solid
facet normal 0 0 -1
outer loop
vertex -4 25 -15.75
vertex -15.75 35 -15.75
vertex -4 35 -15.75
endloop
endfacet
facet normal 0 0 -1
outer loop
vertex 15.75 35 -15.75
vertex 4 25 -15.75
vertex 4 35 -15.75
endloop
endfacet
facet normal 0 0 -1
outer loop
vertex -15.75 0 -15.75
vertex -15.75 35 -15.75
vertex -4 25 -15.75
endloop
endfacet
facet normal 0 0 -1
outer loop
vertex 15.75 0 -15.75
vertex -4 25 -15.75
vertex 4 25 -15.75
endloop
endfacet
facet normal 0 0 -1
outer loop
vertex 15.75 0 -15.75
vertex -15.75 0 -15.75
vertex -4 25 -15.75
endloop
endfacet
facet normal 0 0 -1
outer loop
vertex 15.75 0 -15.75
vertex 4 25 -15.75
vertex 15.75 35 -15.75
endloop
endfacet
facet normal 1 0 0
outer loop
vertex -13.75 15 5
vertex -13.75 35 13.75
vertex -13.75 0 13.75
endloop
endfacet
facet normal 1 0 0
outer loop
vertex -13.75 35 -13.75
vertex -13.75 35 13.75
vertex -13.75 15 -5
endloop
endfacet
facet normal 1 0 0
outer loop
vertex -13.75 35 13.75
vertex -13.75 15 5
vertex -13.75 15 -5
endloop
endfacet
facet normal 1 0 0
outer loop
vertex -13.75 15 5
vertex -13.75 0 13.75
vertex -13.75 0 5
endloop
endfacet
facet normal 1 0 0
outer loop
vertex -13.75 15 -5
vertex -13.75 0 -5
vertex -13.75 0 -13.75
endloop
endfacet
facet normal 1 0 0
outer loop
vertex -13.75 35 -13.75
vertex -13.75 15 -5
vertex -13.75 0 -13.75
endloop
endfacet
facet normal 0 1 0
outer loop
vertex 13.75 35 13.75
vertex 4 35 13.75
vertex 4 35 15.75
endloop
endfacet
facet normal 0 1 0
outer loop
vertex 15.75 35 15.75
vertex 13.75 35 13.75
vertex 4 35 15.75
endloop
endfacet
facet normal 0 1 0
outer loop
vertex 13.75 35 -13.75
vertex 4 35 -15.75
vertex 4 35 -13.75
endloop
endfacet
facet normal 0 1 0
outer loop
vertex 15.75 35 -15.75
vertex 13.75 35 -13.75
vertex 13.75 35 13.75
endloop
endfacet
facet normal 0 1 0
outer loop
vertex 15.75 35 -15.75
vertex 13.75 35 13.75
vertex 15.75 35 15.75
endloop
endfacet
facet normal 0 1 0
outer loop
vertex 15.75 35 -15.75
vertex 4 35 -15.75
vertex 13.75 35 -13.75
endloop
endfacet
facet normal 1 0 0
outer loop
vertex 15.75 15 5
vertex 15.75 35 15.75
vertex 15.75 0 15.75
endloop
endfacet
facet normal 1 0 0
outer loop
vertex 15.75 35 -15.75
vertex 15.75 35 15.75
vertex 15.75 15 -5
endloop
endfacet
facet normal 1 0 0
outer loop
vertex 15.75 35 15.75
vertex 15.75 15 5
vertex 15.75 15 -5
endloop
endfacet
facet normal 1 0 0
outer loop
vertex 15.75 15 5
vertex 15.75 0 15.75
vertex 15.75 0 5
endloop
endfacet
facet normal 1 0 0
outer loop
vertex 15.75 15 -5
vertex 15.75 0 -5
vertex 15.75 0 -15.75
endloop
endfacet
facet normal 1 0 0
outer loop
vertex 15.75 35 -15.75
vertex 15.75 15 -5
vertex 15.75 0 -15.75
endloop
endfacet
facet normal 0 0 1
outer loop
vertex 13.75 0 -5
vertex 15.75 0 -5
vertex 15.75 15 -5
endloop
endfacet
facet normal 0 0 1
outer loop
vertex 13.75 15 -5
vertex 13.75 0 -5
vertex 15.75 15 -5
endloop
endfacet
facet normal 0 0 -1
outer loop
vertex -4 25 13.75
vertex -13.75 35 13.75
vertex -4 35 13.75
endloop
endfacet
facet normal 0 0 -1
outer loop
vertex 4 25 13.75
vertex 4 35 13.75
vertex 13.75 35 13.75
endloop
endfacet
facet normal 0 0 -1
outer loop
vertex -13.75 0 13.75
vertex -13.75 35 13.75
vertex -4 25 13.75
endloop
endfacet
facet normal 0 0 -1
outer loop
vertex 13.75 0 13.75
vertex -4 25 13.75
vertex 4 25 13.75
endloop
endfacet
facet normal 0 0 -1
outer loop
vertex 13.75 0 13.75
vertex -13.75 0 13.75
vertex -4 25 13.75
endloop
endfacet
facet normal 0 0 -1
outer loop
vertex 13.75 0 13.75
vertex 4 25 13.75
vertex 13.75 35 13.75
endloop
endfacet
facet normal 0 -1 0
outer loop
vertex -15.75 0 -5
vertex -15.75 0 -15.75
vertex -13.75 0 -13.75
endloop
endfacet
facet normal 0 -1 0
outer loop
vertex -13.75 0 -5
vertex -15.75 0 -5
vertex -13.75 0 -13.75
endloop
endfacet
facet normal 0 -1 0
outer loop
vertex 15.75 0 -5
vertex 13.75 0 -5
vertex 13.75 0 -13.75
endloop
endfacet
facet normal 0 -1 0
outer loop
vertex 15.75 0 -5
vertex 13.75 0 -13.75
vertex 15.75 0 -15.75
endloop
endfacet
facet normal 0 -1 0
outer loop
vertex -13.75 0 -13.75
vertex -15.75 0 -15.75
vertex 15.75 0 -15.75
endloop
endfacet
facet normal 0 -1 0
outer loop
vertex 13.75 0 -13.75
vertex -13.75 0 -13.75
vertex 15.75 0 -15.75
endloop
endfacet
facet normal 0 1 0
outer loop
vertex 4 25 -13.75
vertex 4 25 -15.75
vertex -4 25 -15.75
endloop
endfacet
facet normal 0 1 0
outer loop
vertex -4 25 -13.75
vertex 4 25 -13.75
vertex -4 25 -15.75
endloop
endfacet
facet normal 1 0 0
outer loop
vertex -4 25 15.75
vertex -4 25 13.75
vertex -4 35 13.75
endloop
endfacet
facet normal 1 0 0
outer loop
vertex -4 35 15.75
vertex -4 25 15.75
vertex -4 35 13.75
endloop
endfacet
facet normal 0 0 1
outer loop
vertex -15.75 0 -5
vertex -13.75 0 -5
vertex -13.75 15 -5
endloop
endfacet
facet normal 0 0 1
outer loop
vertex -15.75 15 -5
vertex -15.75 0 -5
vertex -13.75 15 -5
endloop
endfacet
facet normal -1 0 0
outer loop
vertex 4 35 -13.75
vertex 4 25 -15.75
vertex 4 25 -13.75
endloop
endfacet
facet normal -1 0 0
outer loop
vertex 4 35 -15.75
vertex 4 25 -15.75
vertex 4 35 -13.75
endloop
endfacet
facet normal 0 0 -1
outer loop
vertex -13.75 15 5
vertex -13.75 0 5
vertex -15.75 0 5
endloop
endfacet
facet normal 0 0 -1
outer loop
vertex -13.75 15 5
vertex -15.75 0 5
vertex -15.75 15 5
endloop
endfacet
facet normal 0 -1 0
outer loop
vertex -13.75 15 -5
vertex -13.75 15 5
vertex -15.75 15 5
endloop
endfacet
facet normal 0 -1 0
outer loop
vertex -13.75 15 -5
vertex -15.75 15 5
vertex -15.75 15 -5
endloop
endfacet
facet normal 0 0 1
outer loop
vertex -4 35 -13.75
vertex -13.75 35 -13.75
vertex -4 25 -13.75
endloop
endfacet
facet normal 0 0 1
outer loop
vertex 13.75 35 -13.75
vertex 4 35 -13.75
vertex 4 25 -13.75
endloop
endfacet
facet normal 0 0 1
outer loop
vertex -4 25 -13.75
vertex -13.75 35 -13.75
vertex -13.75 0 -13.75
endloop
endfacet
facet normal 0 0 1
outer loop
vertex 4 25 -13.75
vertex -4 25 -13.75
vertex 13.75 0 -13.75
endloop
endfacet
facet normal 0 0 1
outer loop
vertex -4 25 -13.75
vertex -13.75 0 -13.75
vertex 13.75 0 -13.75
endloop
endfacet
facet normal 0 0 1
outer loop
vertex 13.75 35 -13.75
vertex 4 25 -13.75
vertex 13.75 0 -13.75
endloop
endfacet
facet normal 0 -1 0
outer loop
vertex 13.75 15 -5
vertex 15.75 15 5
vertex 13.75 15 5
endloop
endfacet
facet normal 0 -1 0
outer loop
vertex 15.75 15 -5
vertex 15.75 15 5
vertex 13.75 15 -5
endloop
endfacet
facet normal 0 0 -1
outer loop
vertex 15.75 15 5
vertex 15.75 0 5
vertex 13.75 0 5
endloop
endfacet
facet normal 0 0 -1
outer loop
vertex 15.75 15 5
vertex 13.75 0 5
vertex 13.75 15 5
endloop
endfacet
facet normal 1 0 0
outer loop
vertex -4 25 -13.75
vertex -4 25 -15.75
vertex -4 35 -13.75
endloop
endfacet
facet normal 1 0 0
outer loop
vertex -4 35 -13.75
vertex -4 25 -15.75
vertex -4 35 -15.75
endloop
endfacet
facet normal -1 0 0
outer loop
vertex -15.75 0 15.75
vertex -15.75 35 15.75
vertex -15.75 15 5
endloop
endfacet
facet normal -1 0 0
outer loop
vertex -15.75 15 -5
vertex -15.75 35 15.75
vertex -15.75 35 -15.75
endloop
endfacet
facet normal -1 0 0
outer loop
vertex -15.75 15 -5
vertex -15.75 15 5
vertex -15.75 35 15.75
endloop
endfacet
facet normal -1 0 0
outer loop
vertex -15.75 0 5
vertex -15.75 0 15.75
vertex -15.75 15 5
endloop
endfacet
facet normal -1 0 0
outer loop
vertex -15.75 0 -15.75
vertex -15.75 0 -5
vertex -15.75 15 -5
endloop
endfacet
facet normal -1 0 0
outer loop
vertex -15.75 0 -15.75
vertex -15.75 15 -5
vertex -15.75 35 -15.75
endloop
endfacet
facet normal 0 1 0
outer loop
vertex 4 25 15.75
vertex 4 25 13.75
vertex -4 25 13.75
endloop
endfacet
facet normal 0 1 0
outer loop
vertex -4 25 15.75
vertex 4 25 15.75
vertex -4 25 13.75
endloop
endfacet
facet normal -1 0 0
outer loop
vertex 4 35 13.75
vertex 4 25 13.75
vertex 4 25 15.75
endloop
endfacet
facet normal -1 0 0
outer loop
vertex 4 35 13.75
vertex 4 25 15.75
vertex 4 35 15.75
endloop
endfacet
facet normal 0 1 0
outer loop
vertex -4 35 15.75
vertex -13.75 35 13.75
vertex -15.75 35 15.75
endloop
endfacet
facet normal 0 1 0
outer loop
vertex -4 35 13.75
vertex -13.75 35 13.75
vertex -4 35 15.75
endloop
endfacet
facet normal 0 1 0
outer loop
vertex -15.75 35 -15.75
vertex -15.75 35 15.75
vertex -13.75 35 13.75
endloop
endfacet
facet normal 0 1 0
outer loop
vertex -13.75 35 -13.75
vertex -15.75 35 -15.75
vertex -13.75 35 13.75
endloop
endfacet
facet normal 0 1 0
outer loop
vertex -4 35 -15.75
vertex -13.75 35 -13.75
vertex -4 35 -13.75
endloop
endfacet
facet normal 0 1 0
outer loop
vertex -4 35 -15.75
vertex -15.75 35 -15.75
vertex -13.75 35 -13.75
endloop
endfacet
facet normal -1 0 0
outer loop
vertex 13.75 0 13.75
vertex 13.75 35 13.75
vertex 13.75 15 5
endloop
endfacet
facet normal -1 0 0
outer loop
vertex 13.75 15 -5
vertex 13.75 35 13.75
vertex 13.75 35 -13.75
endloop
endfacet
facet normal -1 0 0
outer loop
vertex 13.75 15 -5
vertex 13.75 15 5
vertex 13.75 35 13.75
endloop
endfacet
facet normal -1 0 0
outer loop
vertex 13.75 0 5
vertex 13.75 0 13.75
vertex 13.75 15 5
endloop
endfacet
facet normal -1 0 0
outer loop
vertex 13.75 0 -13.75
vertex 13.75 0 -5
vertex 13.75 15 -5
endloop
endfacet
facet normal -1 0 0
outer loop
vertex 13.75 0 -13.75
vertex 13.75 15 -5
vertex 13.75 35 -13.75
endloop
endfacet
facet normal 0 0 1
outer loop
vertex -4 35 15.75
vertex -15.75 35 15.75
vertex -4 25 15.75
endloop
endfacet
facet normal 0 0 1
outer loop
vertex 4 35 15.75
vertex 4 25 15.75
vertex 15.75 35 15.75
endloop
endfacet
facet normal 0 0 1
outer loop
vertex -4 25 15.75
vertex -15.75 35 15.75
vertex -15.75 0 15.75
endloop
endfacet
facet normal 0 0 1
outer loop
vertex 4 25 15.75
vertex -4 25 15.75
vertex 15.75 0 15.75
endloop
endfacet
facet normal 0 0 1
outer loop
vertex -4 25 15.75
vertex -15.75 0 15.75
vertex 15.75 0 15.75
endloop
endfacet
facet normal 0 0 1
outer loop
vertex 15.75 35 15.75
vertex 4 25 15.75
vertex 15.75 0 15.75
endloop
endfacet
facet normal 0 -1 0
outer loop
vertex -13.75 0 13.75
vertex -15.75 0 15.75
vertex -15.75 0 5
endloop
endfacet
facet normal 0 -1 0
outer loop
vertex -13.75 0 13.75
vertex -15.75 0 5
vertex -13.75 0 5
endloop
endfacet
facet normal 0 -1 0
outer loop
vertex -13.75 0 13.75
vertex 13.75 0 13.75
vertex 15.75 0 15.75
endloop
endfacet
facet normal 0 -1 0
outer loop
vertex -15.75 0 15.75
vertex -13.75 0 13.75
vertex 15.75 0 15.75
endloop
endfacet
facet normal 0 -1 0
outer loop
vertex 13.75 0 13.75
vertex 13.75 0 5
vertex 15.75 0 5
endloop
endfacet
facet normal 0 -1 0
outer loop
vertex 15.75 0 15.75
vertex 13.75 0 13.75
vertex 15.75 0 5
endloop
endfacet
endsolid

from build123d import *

# Parameters (mm, degrees)
SKETCH1_W           = 31.5
SKETCH1_H           = 31.5
SKETCH1_W_2         = 27.5
SKETCH1_H_2         = 27.5
BOSS_EXTRUDE1_DEPTH = 35
SKETCH2_W           = 10
SKETCH2_H           = 15
CUT_EXTRUDE1_DEPTH  = 32.5
SKETCH3_W           = 8
SKETCH3_H           = 10
CUT_EXTRUDE2_DEPTH  = 32.5


with BuildPart() as part:
    # Sketch1 → Boss-Extrude1 (new body)
    with BuildSketch(Plane(origin=(0, 0, 0), x_dir=(1, 0, 0), z_dir=(0, 1, 0))):
        Rectangle(SKETCH1_W, SKETCH1_H)
        Rectangle(SKETCH1_W_2, SKETCH1_H_2, mode=Mode.SUBTRACT)
    extrude(amount=BOSS_EXTRUDE1_DEPTH)

    # Sketch2 → Cut-Extrude1 (cut, through all)
    with BuildSketch(Plane(origin=(15.75, 0, 0), x_dir=(0, 0, -1), z_dir=(1, 0, 0))):
        with Locations((0, 7.5)):
            Rectangle(SKETCH2_W, SKETCH2_H)
    extrude(amount=-CUT_EXTRUDE1_DEPTH, mode=Mode.SUBTRACT)

    # Sketch3 → Cut-Extrude2 (cut, through all)
    with BuildSketch(Plane(origin=(0, 0, -15.75), x_dir=(-1, 0, 0), z_dir=(0, 0, -1))):
        with Locations((0, 30)):
            Rectangle(SKETCH3_W, SKETCH3_H)
    extrude(amount=-CUT_EXTRUDE2_DEPTH, mode=Mode.SUBTRACT)


solid = part.part
